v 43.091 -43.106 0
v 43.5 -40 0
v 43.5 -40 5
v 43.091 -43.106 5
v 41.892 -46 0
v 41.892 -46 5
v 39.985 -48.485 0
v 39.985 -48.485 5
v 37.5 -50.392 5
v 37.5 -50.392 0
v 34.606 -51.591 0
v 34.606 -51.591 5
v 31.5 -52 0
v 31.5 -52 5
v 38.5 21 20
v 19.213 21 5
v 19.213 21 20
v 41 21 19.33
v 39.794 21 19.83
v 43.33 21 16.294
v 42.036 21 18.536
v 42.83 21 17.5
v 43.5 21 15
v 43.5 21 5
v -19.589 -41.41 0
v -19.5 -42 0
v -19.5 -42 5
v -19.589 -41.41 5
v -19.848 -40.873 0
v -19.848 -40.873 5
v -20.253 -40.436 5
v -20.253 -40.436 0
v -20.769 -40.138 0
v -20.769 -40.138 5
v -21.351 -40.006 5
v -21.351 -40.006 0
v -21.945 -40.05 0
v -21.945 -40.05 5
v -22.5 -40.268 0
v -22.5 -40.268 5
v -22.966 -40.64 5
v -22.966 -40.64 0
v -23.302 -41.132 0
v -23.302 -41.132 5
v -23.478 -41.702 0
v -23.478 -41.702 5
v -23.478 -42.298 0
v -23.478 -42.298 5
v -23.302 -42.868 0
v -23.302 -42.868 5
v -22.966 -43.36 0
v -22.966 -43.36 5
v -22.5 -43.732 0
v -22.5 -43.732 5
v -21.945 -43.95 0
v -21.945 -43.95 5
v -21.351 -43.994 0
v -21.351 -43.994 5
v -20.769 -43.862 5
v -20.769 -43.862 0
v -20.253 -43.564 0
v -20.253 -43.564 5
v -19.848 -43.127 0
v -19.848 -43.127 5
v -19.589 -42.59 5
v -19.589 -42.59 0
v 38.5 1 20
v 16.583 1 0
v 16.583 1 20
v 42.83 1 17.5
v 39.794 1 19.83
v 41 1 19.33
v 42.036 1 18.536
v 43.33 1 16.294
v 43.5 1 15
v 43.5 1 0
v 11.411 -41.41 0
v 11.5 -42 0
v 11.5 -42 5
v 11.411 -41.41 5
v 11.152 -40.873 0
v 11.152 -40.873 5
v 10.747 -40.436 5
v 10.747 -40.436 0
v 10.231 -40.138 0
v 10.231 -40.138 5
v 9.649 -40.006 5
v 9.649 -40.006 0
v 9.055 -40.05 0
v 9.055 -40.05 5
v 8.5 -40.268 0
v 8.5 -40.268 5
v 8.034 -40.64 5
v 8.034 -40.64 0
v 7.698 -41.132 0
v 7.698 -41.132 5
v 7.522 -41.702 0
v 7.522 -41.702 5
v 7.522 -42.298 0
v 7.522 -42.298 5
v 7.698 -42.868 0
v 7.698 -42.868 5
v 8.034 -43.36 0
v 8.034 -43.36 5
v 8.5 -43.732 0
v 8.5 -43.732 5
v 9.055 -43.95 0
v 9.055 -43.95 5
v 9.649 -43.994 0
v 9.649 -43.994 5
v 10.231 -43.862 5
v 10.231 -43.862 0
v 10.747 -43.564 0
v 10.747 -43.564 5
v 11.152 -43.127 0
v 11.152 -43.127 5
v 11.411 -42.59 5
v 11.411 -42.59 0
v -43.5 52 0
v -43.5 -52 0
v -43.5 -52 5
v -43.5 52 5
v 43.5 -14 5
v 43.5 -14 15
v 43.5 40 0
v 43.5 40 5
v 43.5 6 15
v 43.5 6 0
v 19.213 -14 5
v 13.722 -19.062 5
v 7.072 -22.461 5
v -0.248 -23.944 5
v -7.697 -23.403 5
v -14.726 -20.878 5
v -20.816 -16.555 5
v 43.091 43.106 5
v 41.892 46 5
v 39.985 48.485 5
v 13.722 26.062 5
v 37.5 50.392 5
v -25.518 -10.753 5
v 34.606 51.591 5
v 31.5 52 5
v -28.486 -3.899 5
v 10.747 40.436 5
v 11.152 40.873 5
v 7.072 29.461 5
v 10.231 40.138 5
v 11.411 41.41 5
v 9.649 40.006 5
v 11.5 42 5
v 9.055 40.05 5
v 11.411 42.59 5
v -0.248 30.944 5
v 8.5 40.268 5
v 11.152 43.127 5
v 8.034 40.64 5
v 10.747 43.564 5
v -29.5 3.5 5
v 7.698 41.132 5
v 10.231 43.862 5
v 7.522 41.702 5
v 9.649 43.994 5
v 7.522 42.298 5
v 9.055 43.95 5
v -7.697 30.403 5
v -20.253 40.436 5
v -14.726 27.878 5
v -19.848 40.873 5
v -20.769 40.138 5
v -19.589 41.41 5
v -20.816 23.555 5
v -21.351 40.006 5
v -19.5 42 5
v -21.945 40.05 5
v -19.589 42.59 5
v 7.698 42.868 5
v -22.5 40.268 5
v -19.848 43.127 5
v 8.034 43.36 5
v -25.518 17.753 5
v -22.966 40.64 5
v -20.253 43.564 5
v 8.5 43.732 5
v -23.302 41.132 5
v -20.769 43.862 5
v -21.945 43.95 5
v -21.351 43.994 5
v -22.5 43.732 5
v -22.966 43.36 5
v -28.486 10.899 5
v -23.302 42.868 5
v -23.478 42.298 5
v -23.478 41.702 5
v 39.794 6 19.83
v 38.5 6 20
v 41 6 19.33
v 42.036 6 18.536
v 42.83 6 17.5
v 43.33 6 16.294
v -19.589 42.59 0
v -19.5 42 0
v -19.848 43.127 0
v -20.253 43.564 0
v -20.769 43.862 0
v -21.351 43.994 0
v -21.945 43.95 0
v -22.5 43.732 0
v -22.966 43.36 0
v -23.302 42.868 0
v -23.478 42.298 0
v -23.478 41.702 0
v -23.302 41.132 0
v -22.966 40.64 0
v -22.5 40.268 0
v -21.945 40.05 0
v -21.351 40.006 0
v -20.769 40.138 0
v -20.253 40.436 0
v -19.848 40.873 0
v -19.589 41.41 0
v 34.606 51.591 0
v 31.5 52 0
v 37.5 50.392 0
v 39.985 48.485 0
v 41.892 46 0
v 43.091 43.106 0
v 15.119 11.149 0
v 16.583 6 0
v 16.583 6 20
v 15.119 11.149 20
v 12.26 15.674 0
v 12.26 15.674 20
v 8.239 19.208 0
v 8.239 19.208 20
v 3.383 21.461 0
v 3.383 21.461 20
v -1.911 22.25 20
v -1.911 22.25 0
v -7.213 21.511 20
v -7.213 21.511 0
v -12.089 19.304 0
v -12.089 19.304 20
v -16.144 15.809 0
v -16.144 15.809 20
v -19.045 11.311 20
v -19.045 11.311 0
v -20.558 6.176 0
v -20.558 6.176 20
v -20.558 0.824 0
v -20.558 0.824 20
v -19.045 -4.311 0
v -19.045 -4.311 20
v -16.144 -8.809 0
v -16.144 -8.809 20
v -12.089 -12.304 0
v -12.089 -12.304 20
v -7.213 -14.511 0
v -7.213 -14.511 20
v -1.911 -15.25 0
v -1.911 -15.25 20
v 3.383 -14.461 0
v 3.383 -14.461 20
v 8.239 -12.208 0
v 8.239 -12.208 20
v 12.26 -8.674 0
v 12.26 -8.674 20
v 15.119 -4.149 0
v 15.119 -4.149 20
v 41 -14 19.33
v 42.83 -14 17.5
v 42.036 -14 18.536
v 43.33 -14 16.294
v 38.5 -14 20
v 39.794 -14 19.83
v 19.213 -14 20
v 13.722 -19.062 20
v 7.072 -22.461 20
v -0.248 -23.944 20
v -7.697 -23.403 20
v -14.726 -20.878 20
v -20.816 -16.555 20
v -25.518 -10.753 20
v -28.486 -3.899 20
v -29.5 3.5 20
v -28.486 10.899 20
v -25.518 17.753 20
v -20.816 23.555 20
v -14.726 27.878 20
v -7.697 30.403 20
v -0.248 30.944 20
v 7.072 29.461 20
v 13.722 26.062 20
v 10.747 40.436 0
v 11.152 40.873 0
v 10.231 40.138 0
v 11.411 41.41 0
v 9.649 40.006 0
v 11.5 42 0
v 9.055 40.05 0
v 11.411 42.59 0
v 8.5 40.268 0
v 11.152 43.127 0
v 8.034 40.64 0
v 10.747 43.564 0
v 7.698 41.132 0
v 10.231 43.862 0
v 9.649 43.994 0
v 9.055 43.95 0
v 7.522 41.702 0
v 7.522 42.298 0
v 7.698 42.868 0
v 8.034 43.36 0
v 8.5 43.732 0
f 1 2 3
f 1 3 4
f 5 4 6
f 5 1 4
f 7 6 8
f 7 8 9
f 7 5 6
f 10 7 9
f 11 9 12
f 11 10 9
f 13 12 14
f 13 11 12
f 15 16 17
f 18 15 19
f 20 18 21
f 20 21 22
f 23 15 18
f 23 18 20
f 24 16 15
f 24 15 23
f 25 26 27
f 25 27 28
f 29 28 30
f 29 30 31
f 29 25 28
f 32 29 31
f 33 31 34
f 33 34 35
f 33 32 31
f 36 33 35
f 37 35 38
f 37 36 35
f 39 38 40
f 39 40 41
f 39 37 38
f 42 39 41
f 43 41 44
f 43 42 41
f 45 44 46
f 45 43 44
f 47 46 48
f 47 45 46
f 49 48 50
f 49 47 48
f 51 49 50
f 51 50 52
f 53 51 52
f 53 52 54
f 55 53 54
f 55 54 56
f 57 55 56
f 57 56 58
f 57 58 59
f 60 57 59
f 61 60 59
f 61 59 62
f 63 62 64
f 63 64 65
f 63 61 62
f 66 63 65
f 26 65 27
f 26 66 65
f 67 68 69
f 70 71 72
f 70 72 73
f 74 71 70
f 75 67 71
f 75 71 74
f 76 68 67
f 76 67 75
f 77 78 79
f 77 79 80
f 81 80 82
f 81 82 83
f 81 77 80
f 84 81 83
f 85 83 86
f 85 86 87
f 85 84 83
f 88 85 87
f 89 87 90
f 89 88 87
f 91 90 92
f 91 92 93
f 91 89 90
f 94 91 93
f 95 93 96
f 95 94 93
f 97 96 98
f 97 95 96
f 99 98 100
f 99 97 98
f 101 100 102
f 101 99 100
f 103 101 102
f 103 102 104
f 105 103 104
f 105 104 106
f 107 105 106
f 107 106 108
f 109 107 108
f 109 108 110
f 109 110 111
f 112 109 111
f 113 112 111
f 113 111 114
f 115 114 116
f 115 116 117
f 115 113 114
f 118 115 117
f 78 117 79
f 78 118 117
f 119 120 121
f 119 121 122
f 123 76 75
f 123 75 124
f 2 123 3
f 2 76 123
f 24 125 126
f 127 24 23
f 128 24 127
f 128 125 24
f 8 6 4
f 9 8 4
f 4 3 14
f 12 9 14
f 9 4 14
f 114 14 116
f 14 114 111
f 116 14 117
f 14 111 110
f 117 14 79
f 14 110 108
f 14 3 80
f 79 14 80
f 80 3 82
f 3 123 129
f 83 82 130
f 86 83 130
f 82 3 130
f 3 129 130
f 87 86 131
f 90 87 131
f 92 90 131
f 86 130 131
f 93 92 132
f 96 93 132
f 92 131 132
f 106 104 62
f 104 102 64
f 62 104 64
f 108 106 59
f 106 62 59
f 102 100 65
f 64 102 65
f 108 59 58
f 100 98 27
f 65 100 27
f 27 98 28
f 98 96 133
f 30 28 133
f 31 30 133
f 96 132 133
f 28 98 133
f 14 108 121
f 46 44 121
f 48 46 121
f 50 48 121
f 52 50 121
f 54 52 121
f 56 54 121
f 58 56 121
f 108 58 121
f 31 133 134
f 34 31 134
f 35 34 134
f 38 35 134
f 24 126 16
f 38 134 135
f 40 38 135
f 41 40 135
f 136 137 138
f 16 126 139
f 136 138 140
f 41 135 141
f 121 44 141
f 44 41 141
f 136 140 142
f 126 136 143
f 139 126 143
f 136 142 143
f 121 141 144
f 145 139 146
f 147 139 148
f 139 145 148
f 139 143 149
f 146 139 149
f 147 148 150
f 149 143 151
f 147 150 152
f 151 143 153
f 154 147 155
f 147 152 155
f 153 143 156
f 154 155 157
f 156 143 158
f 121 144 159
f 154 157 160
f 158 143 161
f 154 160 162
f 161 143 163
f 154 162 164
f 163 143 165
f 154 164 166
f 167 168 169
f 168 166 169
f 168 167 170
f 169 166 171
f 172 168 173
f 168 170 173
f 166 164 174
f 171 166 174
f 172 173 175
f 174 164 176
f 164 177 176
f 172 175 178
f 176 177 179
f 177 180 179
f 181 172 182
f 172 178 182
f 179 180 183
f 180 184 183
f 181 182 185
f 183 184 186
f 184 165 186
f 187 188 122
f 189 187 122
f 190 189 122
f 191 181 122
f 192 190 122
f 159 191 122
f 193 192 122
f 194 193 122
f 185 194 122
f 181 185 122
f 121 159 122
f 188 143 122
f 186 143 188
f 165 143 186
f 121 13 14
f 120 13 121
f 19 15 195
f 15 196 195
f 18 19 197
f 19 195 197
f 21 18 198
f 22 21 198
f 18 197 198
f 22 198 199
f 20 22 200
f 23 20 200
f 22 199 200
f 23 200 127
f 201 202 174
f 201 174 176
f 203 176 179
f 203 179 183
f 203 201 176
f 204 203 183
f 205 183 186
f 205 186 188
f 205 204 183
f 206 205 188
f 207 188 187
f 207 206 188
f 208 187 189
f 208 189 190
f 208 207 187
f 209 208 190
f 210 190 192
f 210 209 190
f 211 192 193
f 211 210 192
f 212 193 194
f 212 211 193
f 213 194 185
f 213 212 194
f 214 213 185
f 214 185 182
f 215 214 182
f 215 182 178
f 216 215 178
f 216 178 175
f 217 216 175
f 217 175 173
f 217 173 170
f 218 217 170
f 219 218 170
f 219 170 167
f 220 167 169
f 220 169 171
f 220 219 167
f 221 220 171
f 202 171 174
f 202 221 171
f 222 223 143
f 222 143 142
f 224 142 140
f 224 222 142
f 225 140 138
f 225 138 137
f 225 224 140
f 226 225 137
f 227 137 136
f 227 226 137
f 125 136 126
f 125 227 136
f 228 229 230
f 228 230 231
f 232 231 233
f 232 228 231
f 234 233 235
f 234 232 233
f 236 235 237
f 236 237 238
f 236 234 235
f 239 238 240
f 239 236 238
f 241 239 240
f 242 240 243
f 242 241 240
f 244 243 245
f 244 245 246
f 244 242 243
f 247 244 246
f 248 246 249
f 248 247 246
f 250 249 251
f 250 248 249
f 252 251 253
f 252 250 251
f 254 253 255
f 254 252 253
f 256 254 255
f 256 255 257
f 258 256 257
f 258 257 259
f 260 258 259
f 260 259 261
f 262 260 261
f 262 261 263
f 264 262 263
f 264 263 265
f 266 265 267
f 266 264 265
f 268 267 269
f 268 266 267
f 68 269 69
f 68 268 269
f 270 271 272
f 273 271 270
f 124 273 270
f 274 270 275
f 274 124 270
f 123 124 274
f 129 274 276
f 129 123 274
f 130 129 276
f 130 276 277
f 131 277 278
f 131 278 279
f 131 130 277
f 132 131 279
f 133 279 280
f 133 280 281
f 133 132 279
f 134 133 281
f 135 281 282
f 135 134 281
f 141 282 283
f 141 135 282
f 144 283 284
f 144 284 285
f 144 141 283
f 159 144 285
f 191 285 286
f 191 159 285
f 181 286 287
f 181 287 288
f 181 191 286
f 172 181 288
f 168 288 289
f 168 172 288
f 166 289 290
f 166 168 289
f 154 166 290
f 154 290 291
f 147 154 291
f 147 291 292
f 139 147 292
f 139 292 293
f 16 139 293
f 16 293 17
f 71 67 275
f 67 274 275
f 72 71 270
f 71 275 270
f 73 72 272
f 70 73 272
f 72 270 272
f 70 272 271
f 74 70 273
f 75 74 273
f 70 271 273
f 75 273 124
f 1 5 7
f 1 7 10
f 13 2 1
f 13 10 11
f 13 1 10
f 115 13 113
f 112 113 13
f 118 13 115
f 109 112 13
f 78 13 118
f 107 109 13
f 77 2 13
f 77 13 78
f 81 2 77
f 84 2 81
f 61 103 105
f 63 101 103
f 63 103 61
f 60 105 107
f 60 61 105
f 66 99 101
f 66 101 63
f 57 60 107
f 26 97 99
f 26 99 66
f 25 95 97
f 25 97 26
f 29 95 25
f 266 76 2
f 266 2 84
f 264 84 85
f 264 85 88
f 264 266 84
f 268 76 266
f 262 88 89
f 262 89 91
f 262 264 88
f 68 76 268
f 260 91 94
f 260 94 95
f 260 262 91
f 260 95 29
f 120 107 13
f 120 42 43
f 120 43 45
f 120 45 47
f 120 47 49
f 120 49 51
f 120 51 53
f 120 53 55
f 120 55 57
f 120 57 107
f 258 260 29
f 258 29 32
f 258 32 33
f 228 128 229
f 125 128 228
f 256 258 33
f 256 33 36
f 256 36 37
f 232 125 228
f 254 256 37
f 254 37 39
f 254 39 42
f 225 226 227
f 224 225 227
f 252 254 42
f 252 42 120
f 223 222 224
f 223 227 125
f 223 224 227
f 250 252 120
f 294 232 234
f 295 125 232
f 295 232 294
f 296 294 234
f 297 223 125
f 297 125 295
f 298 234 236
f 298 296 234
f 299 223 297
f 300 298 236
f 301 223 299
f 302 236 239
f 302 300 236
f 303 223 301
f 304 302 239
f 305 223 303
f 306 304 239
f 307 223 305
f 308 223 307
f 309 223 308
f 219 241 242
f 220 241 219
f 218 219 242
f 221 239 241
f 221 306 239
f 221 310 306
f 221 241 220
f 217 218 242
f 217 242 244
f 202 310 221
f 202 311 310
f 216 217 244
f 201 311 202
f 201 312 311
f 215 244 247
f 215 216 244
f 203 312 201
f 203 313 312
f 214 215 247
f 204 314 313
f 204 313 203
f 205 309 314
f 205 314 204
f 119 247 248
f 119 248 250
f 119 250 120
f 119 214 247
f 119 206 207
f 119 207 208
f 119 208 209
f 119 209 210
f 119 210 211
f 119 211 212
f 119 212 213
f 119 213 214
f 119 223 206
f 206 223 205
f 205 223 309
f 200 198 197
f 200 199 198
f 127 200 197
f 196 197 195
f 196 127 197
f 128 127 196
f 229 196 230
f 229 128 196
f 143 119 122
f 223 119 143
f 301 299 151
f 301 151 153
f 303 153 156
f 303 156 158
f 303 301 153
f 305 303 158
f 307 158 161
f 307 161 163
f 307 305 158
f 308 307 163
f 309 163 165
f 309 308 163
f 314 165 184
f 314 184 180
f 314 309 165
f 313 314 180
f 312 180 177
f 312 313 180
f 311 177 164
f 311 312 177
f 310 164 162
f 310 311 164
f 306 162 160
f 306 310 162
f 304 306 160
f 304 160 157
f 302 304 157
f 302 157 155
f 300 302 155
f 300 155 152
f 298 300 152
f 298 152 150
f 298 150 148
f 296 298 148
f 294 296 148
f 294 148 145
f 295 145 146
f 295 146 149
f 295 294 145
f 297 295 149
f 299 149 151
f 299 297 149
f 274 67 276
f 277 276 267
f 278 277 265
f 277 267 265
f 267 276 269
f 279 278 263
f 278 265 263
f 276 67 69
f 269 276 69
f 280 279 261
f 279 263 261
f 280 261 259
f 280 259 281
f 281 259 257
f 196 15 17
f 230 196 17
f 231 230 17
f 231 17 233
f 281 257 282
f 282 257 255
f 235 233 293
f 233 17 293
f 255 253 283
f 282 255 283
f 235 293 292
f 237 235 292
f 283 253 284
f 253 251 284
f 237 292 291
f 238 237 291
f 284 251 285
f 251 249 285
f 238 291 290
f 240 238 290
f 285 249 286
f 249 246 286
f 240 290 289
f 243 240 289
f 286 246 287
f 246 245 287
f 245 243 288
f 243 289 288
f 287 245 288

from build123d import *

# Parameters (mm, degrees)
SKETCH1_R           = 2
BOSS_EXTRUDE1_DEPTH = 5
BOSS_EXTRUDE2_DEPTH = 20
FILLET1_R           = 5


with BuildPart() as part:
    # Sketch1 → Boss-Extrude1 (new body)
    with BuildSketch(Plane.XY):
        with BuildLine():
            ThreePointArc((43.5, 40), (39.985281374, 48.485281374), (31.5, 52))
            Line((31.5, 52), (-43.5, 52))
            Line((-43.5, 52), (-43.5, -52))
            Line((-43.5, -52), (31.5, -52))
            ThreePointArc((31.5, -52), (39.985281374, -48.485281374), (43.5, -40))
            Line((43.5, -40), (43.5, -14.000000209))
            Line((43.5, -14.000000209), (39.5, -14.000000209))
            Line((39.5, -14.000000209), (19.213203263, -14.000000209))
            ThreePointArc((19.213203263, -14.000000209), (-29.5, 3.499999932), (19.213203177, 21.000000313))
            Line((19.213203177, 21.000000313), (39.5, 21.000000313))
            Line((39.5, 21.000000313), (43.5, 21.000000313))
            Line((43.5, 21.000000313), (43.5, 40))
        make_face()
        with Locations((-21.5, -42)):
            Circle(SKETCH1_R, mode=Mode.SUBTRACT)
        with Locations((9.5, -42)):
            Circle(SKETCH1_R, mode=Mode.SUBTRACT)
        with Locations((-21.5, 42)):
            Circle(SKETCH1_R, mode=Mode.SUBTRACT)
        with Locations((9.5, 42)):
            Circle(SKETCH1_R, mode=Mode.SUBTRACT)
    extrude(amount=BOSS_EXTRUDE1_DEPTH)

    # Sketch1<3> → Boss-Extrude2 (add)
    with BuildSketch(Plane.XY):
        with BuildLine():
            Line((43.5, 6), (43.5, 21.000000313))
            Line((43.5, 21.000000313), (39.5, 21.000000313))
            Line((39.5, 21.000000313), (19.213203177, 21.000000313))
            ThreePointArc((19.213203177, 21.000000313), (-29.5, 3.499999932), (19.213203263, -14.000000209))
            Line((19.213203263, -14.000000209), (39.5, -14.000000209))
            Line((39.5, -14.000000209), (43.5, -14.000000209))
            Line((43.5, -14.000000209), (43.5, 1))
            Line((43.5, 1), (39.5, 1))
            Line((39.5, 1), (16.582585934, 1))
            ThreePointArc((16.582585934, 1), (-20.75, 3.5), (16.582585934, 6))
            Line((16.582585934, 6), (39.5, 6))
            Line((39.5, 6), (43.5, 6))
        make_face()
    extrude(amount=BOSS_EXTRUDE2_DEPTH)

    # Fillet1
    fillet1_edges = [part.edges().sort_by_distance(p)[0] for p in [
        (43.5, -6.500000104, 20),
        (43.5, 13.500000156, 20),
    ]]
    fillet(fillet1_edges, radius=FILLET1_R)


solid = part.part
